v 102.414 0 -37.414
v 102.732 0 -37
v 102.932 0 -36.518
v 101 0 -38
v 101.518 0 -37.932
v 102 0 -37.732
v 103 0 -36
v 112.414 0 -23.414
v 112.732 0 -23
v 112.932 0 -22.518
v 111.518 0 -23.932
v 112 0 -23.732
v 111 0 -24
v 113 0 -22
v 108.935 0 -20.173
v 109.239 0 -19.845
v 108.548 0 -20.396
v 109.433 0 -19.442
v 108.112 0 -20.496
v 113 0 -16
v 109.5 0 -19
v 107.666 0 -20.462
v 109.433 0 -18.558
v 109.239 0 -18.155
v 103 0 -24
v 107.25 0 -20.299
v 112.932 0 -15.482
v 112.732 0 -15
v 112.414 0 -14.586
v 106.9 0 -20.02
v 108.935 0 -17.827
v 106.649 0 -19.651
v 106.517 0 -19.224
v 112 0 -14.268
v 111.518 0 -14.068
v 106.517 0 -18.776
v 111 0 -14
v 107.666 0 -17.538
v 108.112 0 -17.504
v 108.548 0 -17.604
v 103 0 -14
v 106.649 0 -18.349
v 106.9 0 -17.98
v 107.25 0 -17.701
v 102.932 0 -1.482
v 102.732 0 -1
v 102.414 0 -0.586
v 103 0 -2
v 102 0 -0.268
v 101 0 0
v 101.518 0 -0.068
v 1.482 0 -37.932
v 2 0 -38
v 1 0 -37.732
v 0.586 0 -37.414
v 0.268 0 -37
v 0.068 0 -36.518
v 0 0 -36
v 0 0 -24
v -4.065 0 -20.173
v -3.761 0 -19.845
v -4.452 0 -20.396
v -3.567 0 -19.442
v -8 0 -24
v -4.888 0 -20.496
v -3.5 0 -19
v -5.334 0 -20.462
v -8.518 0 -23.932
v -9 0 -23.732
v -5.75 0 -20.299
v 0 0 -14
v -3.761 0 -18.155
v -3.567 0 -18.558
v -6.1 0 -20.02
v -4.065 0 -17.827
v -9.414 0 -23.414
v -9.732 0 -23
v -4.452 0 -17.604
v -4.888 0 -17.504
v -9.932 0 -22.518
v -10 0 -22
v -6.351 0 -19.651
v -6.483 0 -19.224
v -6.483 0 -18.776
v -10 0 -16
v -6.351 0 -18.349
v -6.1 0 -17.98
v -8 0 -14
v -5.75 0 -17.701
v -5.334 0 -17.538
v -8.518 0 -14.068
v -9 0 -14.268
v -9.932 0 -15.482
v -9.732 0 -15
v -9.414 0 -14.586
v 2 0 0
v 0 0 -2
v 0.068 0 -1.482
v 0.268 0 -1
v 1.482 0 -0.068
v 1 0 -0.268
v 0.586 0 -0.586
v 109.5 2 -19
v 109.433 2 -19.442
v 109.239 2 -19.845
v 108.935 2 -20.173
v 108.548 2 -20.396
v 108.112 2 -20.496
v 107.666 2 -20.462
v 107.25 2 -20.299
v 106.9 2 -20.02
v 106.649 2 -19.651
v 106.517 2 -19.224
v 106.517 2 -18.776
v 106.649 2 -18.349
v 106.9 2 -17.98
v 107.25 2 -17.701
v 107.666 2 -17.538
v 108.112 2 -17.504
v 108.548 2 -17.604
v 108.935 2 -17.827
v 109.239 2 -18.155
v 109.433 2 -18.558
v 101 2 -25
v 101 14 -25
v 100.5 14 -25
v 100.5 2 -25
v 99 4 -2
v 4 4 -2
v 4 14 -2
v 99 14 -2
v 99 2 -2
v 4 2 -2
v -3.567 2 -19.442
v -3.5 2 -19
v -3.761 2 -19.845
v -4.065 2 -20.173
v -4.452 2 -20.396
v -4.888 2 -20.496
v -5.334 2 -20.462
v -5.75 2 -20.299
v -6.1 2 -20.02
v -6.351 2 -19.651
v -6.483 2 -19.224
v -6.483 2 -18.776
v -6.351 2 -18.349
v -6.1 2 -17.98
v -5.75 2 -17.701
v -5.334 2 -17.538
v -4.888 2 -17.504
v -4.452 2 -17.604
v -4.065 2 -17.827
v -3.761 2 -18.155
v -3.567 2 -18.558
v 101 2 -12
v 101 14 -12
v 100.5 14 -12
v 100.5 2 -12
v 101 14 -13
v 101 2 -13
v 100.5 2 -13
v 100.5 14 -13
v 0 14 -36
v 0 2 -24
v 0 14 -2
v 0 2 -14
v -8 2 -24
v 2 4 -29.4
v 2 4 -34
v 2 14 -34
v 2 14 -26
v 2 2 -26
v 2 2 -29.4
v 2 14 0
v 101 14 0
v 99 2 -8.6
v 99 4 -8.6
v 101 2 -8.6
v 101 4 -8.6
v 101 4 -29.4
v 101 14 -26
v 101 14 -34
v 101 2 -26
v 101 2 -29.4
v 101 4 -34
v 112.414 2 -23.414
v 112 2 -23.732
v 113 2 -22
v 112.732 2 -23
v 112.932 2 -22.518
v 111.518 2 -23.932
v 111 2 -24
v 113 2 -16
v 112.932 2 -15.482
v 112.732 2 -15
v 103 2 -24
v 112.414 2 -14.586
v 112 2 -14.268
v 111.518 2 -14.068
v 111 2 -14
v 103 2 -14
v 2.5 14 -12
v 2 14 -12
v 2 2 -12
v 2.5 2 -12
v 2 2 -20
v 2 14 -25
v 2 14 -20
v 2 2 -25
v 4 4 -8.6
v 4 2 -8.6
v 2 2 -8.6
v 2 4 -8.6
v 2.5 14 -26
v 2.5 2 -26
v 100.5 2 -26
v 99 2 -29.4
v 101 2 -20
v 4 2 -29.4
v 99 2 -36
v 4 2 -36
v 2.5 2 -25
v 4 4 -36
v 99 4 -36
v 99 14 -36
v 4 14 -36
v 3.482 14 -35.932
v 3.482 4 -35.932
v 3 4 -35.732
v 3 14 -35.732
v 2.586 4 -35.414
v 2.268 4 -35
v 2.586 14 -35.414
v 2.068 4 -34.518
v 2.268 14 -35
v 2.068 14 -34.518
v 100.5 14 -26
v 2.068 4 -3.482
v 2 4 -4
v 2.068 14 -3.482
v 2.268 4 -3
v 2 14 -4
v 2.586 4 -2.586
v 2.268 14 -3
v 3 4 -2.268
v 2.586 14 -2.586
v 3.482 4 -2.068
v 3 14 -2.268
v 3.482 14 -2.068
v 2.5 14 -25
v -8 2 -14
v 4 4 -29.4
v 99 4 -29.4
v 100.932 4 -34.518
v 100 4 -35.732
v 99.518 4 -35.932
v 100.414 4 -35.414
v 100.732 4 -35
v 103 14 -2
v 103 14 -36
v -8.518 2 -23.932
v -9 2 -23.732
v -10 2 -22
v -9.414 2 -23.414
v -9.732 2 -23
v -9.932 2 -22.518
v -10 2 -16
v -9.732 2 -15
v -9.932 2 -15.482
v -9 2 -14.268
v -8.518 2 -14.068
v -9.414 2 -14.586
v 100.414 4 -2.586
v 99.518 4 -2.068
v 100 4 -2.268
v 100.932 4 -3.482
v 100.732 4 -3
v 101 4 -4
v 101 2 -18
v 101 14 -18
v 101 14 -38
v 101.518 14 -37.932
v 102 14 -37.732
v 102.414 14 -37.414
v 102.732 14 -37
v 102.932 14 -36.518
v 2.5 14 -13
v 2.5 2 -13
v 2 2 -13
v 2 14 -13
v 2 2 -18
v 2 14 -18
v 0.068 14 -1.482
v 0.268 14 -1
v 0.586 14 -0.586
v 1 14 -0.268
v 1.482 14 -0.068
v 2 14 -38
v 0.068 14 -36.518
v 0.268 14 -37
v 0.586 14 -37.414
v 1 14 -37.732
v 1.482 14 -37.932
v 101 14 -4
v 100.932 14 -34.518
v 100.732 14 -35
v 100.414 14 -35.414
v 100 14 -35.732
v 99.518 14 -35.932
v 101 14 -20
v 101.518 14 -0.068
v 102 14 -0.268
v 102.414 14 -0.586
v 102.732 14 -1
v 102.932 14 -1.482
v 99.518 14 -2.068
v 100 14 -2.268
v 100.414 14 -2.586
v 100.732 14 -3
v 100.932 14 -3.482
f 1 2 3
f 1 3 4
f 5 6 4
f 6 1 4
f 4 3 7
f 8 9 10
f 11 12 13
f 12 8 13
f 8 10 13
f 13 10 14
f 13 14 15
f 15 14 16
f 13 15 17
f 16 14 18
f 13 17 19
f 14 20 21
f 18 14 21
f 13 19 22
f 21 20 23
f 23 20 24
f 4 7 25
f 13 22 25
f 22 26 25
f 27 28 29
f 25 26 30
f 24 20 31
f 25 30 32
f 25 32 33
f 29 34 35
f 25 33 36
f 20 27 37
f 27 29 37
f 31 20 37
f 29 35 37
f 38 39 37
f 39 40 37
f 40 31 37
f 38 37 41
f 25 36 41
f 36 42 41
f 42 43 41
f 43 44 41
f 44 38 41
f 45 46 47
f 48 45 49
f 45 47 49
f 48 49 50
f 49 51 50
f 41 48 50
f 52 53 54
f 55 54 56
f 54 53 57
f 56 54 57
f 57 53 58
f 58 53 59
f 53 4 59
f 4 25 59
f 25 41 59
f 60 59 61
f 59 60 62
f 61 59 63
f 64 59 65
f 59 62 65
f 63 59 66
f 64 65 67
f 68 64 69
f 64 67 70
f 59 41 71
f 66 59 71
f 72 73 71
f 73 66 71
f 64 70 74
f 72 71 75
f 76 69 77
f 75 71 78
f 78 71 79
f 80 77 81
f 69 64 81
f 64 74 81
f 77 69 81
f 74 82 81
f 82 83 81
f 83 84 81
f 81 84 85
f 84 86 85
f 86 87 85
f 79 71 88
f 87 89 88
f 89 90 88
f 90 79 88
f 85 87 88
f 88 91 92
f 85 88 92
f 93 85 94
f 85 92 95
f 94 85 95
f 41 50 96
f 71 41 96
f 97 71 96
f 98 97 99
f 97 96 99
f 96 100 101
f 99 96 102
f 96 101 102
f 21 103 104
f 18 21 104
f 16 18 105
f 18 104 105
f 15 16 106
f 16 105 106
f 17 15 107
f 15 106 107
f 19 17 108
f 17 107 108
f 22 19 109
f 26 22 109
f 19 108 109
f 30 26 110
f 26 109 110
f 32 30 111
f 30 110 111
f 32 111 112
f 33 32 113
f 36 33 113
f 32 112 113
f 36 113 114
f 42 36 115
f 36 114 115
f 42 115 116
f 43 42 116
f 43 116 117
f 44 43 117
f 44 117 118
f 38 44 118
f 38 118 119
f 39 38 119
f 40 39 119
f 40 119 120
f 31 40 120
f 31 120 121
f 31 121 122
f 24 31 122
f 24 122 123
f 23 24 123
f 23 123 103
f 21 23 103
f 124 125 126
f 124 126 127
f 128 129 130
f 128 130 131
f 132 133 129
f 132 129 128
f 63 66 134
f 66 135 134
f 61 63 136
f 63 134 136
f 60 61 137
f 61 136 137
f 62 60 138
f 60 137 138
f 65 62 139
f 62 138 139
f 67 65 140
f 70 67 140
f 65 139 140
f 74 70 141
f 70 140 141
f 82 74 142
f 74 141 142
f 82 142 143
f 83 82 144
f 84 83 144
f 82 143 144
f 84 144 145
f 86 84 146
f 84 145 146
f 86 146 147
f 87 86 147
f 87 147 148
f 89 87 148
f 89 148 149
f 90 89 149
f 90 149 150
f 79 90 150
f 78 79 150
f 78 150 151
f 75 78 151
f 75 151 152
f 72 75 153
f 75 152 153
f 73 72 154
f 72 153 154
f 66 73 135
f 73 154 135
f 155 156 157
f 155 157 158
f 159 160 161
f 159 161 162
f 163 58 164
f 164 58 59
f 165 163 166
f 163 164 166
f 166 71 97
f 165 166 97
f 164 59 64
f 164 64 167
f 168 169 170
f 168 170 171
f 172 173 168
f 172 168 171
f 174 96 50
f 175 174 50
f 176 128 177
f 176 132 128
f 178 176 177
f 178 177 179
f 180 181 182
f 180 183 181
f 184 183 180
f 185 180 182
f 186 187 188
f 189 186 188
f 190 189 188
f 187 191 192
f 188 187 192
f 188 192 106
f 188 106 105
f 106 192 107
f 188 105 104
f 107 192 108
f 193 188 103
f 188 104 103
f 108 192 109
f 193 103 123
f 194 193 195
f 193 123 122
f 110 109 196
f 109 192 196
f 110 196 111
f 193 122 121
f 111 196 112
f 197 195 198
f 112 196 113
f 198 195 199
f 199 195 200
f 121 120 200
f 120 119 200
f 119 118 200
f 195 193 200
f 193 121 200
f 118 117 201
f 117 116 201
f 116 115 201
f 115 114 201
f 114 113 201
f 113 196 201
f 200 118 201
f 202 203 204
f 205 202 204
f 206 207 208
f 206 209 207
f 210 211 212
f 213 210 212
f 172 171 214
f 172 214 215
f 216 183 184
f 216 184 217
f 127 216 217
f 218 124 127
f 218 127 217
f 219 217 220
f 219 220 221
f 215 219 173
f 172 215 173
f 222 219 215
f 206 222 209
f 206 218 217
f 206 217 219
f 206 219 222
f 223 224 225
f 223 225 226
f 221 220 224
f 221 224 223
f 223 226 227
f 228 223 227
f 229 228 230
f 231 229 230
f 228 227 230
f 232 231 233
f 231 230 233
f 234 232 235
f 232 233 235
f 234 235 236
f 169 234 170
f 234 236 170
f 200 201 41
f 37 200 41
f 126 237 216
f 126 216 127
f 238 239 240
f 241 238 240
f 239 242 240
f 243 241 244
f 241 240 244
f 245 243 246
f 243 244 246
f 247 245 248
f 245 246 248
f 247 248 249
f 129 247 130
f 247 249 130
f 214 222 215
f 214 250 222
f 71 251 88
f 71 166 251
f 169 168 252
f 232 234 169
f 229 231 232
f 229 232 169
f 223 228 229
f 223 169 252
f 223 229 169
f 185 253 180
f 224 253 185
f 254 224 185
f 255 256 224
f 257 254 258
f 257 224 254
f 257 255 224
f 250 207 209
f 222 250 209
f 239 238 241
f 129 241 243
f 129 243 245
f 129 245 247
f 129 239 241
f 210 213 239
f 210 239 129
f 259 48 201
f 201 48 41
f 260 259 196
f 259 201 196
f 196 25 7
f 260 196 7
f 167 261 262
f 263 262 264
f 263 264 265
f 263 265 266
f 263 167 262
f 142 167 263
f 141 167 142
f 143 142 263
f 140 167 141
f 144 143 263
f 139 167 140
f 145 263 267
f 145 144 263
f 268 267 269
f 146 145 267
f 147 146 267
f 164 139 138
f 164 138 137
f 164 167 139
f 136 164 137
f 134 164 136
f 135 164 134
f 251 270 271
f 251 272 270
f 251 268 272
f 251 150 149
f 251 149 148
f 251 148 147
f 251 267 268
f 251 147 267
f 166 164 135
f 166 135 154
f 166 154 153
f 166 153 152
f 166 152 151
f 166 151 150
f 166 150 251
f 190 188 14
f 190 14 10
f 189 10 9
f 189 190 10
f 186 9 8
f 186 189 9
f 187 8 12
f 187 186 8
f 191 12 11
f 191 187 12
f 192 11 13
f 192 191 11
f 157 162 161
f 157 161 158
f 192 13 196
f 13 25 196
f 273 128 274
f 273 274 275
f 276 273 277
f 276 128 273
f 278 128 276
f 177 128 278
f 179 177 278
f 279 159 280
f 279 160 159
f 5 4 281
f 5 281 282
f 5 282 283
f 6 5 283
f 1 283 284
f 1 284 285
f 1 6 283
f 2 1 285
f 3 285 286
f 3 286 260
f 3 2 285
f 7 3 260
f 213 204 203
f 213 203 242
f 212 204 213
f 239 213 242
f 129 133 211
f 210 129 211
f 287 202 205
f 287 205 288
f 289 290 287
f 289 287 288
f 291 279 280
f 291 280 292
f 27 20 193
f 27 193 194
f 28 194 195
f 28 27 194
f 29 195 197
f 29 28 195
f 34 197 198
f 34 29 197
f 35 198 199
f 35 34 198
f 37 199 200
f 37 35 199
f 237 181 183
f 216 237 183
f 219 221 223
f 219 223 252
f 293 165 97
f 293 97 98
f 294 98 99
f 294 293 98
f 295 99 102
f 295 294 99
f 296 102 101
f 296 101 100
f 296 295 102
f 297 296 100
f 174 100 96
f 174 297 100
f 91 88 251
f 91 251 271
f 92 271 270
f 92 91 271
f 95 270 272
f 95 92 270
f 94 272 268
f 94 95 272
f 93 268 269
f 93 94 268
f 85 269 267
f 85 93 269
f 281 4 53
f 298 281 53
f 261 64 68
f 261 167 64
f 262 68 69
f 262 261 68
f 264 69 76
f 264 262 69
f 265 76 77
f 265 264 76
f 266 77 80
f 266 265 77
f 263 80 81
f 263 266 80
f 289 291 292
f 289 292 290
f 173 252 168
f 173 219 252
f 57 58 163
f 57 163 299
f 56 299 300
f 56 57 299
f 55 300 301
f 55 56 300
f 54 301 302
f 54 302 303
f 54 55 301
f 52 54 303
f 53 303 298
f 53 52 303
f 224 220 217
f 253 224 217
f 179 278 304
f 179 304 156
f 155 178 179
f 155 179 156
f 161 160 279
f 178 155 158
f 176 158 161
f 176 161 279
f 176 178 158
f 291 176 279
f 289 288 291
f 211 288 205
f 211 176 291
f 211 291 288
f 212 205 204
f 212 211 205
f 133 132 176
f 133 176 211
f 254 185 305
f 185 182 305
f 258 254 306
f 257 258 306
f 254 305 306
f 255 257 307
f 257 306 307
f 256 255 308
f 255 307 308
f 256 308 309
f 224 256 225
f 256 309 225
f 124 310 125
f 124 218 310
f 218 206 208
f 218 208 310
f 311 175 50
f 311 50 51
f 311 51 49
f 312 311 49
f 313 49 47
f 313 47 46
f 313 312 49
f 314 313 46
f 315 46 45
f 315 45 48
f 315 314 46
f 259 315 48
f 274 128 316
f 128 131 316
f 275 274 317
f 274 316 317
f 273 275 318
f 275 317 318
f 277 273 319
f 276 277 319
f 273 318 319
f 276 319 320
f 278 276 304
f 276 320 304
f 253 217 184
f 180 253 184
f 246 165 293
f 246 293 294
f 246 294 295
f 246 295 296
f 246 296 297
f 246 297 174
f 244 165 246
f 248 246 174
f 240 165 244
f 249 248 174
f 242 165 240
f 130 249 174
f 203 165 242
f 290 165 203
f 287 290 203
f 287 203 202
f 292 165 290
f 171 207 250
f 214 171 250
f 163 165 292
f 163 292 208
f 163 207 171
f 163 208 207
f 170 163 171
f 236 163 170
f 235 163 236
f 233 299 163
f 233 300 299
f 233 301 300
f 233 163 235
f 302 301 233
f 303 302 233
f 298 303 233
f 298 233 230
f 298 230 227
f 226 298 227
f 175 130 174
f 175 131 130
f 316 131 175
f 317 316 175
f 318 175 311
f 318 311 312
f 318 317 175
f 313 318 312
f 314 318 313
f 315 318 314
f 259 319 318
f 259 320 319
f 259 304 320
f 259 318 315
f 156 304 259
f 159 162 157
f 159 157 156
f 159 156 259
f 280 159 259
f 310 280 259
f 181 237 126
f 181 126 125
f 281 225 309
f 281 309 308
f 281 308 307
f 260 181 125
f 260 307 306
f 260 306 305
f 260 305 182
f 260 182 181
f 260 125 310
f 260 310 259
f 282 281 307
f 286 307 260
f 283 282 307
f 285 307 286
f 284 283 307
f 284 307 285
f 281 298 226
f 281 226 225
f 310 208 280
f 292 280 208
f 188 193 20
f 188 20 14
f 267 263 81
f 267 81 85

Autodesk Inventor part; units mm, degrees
ref_plane "YZ Plane" through (0, 0, 0) normal (1, 0, 0) x (0, 1, 0)
ref_plane "XZ Plane" through (0, 0, 0) normal (0, 1, 0) x (-1, 0, 0)
ref_plane "XY Plane" through (0, 0, 0) normal (0, 0, 1) x (1, 0, 0)
sketch "Sketch1" plane through (0, 0, 0) normal (0, 1, 0) x (-1, 0, 0)
  line L0 (0, 0) -> (-103, 0)
  line L1 (-103, 0) -> (-103, -38)
  line L2 (-103, -38) -> (0, -38)
  line L3 (0, -38) -> (0, 0)
  dimension "d0" = 103
  dimension "d1" = 38
extrude "Extrusion1" add sketch "Sketch1" along normal blind 2
sketch "Sketch2" plane through (0, 2, 0) normal (0, 1, 0) x (1, 0, 0)
  line L0 (2, 2) -> (101, 2)
  line L1 (101, 2) -> (101, 18)
  line L2 (101, 18) -> (2, 18)
  line L3 (2, 18) -> (2, 2)
  line L4 (2, 20) -> (101, 20)
  line L5 (101, 20) -> (101, 36)
  line L6 (101, 36) -> (2, 36)
  line L7 (2, 36) -> (2, 20)
  line L8 (0, 0) -> (2, 0)
  line L9 (2, 0) -> (2, 2)
  line L10 (2, 2) -> (0, 2)
  line L11 (0, 2) -> (0, 0)
  line L12 (103, 38) -> (0, 38) projected
  line L13 (0, 38) -> (2, 38)
  line L14 (2, 38) -> (2, 36)
  line L15 (2, 36) -> (0, 36)
  line L16 (0, 36) -> (0, 38)
  line L17 (103, 0) -> (103, 38) projected
  line L18 (0, 0) -> (103, 0)
  line L19 (103, 0) -> (103, 38)
  line L20 (103, 38) -> (0, 38)
  line L21 (0, 38) -> (0, 0)
  dimension "d4" = 99
  dimension "d5" = 16
  dimension "d6" = 99
  dimension "d7" = 16
  dimension "d8" = 2
  dimension "d9" = 2
  dimension "d10" = 2
  dimension "d11" = 2
extrude "Extrusion2" add sketch "Sketch2" along normal blind 12
sketch "Sketch3" plane through (101, 2, -18) normal (-1, 0, 0) x (0, 0, 1)
  line L0 (18, 12) -> (-20, 12) projected
  line L1 (5, 12) -> (6, 12)
  line L2 (6, 12) -> (6, 0)
  line L3 (6, 0) -> (5, 0)
  line L4 (5, 0) -> (5, 12)
  line L5 (0, 12) -> (5, 12)
  line L6 (5, 12) -> (5, 0)
  line L7 (5, 0) -> (0, 0)
  line L8 (0, 0) -> (0, 12)
  point P0 (18, -2)
  dimension "d14" = 1
  dimension "d15" = 12
  dimension "d16" = 5
  dimension "d17" = 12
extrude "Extrusion3" add sketch "Sketch3" along normal blind 0.5 contours L2 L3 L4 L0
sketch "Sketch4" plane through (2, 2, -2) normal (1, 0, 0) x (0, 0, -1)
  line L0 (16, 12) -> (11, 12)
  line L1 (11, 12) -> (11, 0)
  line L2 (11, 0) -> (16, 0)
  line L3 (16, 0) -> (16, 12)
  line L4 (11, 12) -> (10, 12)
  line L5 (10, 12) -> (10, 0)
  line L6 (10, 0) -> (11, 0)
  line L7 (11, 0) -> (11, 12)
  point P0 (-2, -2)
  point P1 (11, 0)
  dimension "d20" = 5
  dimension "d21" = 12
  dimension "d22" = 1
  dimension "d23" = 12
extrude "Extrusion4" add sketch "Sketch4" along normal blind 0.5 contours L1 L6 L5 L4
sketch "Sketch5" plane through (2, 2, -20) normal (1, 0, 0) x (0, 0, -1)
  line L0 (0, 12) -> (5, 12)
  line L1 (5, 12) -> (5, 0)
  line L2 (5, 0) -> (0, 0)
  line L3 (0, 0) -> (0, 12)
  line L4 (5, 12) -> (6, 12)
  line L5 (6, 12) -> (6, 0)
  line L6 (6, 0) -> (5, 0)
  line L7 (5, 0) -> (5, 12)
  point P0 (-20, -2)
  point P1 (5, 0)
  dimension "d26" = 5
  dimension "d27" = 12
  dimension "d28" = 1
  dimension "d29" = 12
extrude "Extrusion5" add sketch "Sketch5" along normal blind 0.5 contours L4 L5 L6 L1
sketch "Sketch6" plane through (101, 2, -36) normal (-1, 0, 0) x (0, 0, 1)
  line L0 (16, 12) -> (11, 12)
  line L1 (11, 12) -> (11, 0)
  line L2 (11, 0) -> (16, 0)
  line L3 (16, 0) -> (16, 12)
  line L4 (11, 12) -> (10, 12)
  line L5 (10, 12) -> (10, 0)
  line L6 (10, 0) -> (11, 0)
  line L7 (11, 0) -> (11, 12)
  point P0 (36, -2)
  point P1 (11, 0)
  dimension "d32" = 5
  dimension "d33" = 12
  dimension "d34" = 1
  dimension "d35" = 12
extrude "Extrusion6" add sketch "Sketch6" along normal blind 0.5 contours L1 L6 L5 L4
sketch "Sketch7" plane through (103, 0, 0) normal (1, 0, 0) x (0, 0, -1)
  line L0 (14, 0) -> (24, 0)
  line L1 (24, 0) -> (24, 2)
  line L2 (24, 2) -> (14, 2)
  line L3 (14, 2) -> (14, 0)
  line L4 (0, 0) -> (38, 0) projected
  point P0 (19, 0)
  dimension "d38" = 10
  dimension "d39" = 2
extrude "Extrusion7" add sketch "Sketch7" along normal blind 10
sketch "Sketch8" plane through (103, 2, -14) normal (0, 1, 0) x (1, 0, 0)
  line L0 (10, 10) -> (10, 0) projected
  line L1 (10, 5) -> (0, 5)
  line L2 (0, -14) -> (0, 24) projected
  circle A0 centre (5, 5) radius 1.5
  point P0 (-103, -14)
  dimension "d42" = 3
extrude "Extrusion8" cut sketch "Sketch8" against normal blind 2
sketch "Sketch9" plane through (0, 0, -38) normal (-1, 0, 0) x (0, 0, 1)
  line L0 (24, 0) -> (14, 0)
  line L1 (14, 0) -> (14, 2)
  line L2 (14, 2) -> (24, 2)
  line L3 (24, 2) -> (24, 0)
  line L4 (0, 0) -> (38, 0) projected
  point P0 (19, 0)
  dimension "d45" = 10
  dimension "d46" = 2
extrude "Extrusion9" add sketch "Sketch9" along normal blind 10
sketch "Sketch10" plane through (0, 2, -14) normal (0, 1, 0) x (1, 0, 0)
  line L0 (-10, 10) -> (-10, 0) projected
  line L1 (-10, 5) -> (0, 5)
  line L2 (0, 24) -> (0, -14) projected
  circle A0 centre (-5, 5) radius 1.5
  dimension "d49" = 3
extrude "Extrusion10" cut sketch "Sketch10" against normal blind 2
fillet "Fillet1" radius 2 12 edges at (0, 7, 0) (103, 7, 0) (103, 7, -38) (113, 1, -14) (113, 1, -24) (0, 7, -38) (-10, 1, -24) (-10, 1, -14) (2, 8, -36) (101, 8, -36) (101, 8, -2) (2, 8, -2)
sketch "Sketch11" plane through (0, 2, 0) normal (0, 1, 0) x (1, 0, 0)
  line L0 (101, 36) -> (99, 36)
  line L1 (99, 36) -> (99, 29.4)
  line L2 (99, 29.4) -> (101, 29.4)
  line L3 (101, 29.4) -> (101, 36)
  line L4 (2, 36) -> (4, 36)
  line L5 (4, 36) -> (4, 29.4)
  line L6 (4, 29.4) -> (2, 29.4)
  line L7 (2, 29.4) -> (2, 36)
  line L8 (2, 2) -> (4, 2)
  line L9 (4, 2) -> (4, 8.6)
  line L10 (4, 8.6) -> (2, 8.6)
  line L11 (2, 8.6) -> (2, 2)
  line L12 (101, 2) -> (99, 2)
  line L13 (99, 2) -> (99, 8.6)
  line L14 (99, 8.6) -> (101, 8.6)
  line L15 (101, 8.6) -> (101, 2)
  point P0 (0, 0)
  dimension "d53" = 2
  dimension "d54" = 6.6
  dimension "d55" = 2
  dimension "d56" = 6.6
  dimension "d57" = 2
  dimension "d58" = 6.6
  dimension "d59" = 2
  dimension "d60" = 6.6
extrude "Extrusion11" add sketch "Sketch11" along normal blind 2
properties part number "power_strip"
